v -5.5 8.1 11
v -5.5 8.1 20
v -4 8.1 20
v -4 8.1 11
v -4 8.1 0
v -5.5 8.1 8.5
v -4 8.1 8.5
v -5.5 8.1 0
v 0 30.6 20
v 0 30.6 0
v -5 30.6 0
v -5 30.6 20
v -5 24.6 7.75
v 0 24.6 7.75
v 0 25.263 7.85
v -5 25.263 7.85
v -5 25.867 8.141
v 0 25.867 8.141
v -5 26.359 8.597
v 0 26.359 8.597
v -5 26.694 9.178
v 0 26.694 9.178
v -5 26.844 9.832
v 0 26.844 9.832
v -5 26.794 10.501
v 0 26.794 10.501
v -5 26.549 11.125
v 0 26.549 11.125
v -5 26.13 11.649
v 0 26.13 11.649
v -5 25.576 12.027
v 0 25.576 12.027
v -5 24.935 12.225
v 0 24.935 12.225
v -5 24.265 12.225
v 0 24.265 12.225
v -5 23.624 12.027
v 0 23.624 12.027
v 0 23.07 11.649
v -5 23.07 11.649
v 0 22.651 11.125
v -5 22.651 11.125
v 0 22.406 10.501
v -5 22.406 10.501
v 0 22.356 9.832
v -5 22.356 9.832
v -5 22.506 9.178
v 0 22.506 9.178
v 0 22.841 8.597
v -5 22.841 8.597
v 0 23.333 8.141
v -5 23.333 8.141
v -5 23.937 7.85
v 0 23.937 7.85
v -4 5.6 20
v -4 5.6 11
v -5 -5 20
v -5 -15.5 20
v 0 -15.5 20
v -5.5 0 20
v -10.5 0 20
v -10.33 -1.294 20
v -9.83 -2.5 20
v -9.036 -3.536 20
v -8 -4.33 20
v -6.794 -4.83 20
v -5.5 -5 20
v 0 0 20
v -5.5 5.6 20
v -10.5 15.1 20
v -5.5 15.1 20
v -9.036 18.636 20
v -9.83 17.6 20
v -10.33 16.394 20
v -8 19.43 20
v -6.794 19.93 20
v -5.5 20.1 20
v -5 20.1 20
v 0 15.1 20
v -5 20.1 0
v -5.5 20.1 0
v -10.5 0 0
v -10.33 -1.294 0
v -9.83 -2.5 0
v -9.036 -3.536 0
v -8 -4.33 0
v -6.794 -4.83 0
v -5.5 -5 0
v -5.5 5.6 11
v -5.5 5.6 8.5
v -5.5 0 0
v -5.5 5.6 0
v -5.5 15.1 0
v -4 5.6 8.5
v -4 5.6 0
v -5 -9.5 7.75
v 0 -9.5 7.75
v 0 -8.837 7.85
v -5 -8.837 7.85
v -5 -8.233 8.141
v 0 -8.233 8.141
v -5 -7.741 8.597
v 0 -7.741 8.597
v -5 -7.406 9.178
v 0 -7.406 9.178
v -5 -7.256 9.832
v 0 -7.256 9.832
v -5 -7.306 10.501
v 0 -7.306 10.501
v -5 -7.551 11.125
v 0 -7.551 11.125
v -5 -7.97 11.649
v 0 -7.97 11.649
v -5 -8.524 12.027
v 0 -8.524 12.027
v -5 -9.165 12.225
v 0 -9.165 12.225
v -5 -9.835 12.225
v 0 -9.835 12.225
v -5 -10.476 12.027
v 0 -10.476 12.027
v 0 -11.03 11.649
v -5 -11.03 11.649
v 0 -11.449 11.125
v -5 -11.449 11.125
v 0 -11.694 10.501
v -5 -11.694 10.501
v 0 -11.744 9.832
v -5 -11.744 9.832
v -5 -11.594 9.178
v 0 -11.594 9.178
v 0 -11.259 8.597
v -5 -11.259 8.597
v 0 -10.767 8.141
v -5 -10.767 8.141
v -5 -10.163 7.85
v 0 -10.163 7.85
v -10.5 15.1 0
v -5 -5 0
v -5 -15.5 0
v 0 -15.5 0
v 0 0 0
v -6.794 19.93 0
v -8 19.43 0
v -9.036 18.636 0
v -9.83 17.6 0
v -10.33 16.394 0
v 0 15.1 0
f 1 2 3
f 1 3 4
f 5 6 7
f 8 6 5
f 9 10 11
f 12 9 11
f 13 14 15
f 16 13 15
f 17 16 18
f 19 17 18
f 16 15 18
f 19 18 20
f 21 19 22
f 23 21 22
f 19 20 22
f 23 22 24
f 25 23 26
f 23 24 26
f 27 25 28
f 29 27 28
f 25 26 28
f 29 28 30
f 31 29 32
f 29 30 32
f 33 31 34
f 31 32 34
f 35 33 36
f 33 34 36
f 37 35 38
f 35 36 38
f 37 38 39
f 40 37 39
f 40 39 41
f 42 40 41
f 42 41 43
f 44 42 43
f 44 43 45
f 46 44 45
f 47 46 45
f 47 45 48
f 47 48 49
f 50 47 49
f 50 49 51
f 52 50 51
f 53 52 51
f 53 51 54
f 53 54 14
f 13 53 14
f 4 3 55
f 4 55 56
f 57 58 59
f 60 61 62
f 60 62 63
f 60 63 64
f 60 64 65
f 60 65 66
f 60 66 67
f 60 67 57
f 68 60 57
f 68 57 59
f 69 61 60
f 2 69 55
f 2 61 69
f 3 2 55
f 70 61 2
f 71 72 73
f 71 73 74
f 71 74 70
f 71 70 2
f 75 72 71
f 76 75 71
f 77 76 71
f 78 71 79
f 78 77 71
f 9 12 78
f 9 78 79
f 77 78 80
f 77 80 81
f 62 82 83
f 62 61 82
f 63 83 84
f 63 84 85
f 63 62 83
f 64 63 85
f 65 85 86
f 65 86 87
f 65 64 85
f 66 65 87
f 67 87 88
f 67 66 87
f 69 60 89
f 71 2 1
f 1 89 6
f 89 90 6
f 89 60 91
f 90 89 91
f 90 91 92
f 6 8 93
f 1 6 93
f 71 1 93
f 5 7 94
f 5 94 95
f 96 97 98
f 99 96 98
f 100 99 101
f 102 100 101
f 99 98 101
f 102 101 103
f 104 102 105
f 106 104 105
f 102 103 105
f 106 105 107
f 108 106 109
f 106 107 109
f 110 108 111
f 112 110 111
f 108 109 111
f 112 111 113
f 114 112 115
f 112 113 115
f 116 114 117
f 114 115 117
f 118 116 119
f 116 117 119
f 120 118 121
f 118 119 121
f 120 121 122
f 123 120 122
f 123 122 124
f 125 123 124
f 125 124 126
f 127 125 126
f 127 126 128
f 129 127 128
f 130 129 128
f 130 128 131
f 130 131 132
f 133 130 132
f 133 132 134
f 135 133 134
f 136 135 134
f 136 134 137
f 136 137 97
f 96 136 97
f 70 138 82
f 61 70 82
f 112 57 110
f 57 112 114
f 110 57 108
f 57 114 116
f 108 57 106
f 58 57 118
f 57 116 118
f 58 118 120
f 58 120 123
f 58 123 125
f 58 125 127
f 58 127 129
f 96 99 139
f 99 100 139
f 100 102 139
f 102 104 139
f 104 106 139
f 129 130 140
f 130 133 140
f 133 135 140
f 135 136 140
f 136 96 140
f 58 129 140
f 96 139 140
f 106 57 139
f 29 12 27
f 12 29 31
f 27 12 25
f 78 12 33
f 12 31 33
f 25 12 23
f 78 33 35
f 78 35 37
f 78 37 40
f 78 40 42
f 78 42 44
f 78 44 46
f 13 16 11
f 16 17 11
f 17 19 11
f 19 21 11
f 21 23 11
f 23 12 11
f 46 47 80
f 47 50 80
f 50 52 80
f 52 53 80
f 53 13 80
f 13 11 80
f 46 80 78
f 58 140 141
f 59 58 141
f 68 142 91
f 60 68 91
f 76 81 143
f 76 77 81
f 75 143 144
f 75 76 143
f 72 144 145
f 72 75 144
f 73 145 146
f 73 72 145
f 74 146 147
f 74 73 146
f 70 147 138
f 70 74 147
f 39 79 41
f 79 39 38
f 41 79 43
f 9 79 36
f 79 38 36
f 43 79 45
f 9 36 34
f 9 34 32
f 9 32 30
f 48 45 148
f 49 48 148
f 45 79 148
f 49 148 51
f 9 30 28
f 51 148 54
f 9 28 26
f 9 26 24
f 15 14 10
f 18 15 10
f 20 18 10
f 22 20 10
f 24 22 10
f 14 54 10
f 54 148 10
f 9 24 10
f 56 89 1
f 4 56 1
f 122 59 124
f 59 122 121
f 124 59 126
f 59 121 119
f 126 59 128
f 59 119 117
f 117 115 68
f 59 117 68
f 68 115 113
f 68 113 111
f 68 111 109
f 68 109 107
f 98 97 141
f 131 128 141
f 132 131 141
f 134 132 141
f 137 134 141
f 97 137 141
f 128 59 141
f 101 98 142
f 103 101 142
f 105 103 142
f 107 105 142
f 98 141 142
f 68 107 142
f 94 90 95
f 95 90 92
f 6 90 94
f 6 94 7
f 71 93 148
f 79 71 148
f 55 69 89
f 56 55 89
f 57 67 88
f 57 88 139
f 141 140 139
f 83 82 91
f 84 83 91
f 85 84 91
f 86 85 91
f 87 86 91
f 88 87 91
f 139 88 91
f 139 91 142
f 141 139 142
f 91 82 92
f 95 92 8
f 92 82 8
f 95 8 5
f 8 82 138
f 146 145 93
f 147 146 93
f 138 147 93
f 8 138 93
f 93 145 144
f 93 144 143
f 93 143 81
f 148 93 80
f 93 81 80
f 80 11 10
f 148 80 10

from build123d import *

# Parameters (mm, degrees)
ESTRUSIONE_ESTRUSIONE1_DEPTH = 20
M4_CLEARANCE_HOLE1_D         = 4.5
RACCORDO1_R                  = 5
SCHIZZO4_W                   = 9
SCHIZZO4_H                   = 2.5
SCHIZZO4_W_2                 = 8.5
ESTRUSIONE_ESTRUSIONE2_DEPTH = 1.5


with BuildPart() as part:
    # Schizzo1 → Estrusione-Estrusione1 (new body)
    with BuildSketch(Plane.XY):
        Polygon((0, 30.6), (-5, 30.6), (-5, 20.1), (-10.5, 20.1), (-10.5, -5), (-5, -5), (-5, -15.5), (0, -15.5), (0, 0), (-5.5, 0), (-5.5, 15.1), (0, 15.1), align=None)
    extrude(amount=ESTRUSIONE_ESTRUSIONE1_DEPTH)

    # M4 Clearance Hole1 (through all)
    with Locations(Plane.ZY.offset(5)):
        with Locations((10, 24.6), (10, -9.5)):
            Hole(M4_CLEARANCE_HOLE1_D / 2)

    # Raccordo1
    raccordo1_edges = [part.edges().sort_by_distance(p)[0] for p in [
        (-10.5, -5, 10),
        (-10.5, 20.1, 10),
    ]]
    fillet(raccordo1_edges, radius=RACCORDO1_R)

    # Schizzo4 → Estrusione-Estrusione2 (add)
    with BuildSketch(Plane(origin=(-5.5, 0, 0), x_dir=(0, 0, -1), z_dir=(1, 0, 0))):
        with Locations((-15.5, 6.85)):
            Rectangle(SCHIZZO4_W, SCHIZZO4_H)
        with Locations((-4.25, 6.85)):
            Rectangle(SCHIZZO4_W_2, SCHIZZO4_H)
    extrude(amount=ESTRUSIONE_ESTRUSIONE2_DEPTH)


solid = part.part
